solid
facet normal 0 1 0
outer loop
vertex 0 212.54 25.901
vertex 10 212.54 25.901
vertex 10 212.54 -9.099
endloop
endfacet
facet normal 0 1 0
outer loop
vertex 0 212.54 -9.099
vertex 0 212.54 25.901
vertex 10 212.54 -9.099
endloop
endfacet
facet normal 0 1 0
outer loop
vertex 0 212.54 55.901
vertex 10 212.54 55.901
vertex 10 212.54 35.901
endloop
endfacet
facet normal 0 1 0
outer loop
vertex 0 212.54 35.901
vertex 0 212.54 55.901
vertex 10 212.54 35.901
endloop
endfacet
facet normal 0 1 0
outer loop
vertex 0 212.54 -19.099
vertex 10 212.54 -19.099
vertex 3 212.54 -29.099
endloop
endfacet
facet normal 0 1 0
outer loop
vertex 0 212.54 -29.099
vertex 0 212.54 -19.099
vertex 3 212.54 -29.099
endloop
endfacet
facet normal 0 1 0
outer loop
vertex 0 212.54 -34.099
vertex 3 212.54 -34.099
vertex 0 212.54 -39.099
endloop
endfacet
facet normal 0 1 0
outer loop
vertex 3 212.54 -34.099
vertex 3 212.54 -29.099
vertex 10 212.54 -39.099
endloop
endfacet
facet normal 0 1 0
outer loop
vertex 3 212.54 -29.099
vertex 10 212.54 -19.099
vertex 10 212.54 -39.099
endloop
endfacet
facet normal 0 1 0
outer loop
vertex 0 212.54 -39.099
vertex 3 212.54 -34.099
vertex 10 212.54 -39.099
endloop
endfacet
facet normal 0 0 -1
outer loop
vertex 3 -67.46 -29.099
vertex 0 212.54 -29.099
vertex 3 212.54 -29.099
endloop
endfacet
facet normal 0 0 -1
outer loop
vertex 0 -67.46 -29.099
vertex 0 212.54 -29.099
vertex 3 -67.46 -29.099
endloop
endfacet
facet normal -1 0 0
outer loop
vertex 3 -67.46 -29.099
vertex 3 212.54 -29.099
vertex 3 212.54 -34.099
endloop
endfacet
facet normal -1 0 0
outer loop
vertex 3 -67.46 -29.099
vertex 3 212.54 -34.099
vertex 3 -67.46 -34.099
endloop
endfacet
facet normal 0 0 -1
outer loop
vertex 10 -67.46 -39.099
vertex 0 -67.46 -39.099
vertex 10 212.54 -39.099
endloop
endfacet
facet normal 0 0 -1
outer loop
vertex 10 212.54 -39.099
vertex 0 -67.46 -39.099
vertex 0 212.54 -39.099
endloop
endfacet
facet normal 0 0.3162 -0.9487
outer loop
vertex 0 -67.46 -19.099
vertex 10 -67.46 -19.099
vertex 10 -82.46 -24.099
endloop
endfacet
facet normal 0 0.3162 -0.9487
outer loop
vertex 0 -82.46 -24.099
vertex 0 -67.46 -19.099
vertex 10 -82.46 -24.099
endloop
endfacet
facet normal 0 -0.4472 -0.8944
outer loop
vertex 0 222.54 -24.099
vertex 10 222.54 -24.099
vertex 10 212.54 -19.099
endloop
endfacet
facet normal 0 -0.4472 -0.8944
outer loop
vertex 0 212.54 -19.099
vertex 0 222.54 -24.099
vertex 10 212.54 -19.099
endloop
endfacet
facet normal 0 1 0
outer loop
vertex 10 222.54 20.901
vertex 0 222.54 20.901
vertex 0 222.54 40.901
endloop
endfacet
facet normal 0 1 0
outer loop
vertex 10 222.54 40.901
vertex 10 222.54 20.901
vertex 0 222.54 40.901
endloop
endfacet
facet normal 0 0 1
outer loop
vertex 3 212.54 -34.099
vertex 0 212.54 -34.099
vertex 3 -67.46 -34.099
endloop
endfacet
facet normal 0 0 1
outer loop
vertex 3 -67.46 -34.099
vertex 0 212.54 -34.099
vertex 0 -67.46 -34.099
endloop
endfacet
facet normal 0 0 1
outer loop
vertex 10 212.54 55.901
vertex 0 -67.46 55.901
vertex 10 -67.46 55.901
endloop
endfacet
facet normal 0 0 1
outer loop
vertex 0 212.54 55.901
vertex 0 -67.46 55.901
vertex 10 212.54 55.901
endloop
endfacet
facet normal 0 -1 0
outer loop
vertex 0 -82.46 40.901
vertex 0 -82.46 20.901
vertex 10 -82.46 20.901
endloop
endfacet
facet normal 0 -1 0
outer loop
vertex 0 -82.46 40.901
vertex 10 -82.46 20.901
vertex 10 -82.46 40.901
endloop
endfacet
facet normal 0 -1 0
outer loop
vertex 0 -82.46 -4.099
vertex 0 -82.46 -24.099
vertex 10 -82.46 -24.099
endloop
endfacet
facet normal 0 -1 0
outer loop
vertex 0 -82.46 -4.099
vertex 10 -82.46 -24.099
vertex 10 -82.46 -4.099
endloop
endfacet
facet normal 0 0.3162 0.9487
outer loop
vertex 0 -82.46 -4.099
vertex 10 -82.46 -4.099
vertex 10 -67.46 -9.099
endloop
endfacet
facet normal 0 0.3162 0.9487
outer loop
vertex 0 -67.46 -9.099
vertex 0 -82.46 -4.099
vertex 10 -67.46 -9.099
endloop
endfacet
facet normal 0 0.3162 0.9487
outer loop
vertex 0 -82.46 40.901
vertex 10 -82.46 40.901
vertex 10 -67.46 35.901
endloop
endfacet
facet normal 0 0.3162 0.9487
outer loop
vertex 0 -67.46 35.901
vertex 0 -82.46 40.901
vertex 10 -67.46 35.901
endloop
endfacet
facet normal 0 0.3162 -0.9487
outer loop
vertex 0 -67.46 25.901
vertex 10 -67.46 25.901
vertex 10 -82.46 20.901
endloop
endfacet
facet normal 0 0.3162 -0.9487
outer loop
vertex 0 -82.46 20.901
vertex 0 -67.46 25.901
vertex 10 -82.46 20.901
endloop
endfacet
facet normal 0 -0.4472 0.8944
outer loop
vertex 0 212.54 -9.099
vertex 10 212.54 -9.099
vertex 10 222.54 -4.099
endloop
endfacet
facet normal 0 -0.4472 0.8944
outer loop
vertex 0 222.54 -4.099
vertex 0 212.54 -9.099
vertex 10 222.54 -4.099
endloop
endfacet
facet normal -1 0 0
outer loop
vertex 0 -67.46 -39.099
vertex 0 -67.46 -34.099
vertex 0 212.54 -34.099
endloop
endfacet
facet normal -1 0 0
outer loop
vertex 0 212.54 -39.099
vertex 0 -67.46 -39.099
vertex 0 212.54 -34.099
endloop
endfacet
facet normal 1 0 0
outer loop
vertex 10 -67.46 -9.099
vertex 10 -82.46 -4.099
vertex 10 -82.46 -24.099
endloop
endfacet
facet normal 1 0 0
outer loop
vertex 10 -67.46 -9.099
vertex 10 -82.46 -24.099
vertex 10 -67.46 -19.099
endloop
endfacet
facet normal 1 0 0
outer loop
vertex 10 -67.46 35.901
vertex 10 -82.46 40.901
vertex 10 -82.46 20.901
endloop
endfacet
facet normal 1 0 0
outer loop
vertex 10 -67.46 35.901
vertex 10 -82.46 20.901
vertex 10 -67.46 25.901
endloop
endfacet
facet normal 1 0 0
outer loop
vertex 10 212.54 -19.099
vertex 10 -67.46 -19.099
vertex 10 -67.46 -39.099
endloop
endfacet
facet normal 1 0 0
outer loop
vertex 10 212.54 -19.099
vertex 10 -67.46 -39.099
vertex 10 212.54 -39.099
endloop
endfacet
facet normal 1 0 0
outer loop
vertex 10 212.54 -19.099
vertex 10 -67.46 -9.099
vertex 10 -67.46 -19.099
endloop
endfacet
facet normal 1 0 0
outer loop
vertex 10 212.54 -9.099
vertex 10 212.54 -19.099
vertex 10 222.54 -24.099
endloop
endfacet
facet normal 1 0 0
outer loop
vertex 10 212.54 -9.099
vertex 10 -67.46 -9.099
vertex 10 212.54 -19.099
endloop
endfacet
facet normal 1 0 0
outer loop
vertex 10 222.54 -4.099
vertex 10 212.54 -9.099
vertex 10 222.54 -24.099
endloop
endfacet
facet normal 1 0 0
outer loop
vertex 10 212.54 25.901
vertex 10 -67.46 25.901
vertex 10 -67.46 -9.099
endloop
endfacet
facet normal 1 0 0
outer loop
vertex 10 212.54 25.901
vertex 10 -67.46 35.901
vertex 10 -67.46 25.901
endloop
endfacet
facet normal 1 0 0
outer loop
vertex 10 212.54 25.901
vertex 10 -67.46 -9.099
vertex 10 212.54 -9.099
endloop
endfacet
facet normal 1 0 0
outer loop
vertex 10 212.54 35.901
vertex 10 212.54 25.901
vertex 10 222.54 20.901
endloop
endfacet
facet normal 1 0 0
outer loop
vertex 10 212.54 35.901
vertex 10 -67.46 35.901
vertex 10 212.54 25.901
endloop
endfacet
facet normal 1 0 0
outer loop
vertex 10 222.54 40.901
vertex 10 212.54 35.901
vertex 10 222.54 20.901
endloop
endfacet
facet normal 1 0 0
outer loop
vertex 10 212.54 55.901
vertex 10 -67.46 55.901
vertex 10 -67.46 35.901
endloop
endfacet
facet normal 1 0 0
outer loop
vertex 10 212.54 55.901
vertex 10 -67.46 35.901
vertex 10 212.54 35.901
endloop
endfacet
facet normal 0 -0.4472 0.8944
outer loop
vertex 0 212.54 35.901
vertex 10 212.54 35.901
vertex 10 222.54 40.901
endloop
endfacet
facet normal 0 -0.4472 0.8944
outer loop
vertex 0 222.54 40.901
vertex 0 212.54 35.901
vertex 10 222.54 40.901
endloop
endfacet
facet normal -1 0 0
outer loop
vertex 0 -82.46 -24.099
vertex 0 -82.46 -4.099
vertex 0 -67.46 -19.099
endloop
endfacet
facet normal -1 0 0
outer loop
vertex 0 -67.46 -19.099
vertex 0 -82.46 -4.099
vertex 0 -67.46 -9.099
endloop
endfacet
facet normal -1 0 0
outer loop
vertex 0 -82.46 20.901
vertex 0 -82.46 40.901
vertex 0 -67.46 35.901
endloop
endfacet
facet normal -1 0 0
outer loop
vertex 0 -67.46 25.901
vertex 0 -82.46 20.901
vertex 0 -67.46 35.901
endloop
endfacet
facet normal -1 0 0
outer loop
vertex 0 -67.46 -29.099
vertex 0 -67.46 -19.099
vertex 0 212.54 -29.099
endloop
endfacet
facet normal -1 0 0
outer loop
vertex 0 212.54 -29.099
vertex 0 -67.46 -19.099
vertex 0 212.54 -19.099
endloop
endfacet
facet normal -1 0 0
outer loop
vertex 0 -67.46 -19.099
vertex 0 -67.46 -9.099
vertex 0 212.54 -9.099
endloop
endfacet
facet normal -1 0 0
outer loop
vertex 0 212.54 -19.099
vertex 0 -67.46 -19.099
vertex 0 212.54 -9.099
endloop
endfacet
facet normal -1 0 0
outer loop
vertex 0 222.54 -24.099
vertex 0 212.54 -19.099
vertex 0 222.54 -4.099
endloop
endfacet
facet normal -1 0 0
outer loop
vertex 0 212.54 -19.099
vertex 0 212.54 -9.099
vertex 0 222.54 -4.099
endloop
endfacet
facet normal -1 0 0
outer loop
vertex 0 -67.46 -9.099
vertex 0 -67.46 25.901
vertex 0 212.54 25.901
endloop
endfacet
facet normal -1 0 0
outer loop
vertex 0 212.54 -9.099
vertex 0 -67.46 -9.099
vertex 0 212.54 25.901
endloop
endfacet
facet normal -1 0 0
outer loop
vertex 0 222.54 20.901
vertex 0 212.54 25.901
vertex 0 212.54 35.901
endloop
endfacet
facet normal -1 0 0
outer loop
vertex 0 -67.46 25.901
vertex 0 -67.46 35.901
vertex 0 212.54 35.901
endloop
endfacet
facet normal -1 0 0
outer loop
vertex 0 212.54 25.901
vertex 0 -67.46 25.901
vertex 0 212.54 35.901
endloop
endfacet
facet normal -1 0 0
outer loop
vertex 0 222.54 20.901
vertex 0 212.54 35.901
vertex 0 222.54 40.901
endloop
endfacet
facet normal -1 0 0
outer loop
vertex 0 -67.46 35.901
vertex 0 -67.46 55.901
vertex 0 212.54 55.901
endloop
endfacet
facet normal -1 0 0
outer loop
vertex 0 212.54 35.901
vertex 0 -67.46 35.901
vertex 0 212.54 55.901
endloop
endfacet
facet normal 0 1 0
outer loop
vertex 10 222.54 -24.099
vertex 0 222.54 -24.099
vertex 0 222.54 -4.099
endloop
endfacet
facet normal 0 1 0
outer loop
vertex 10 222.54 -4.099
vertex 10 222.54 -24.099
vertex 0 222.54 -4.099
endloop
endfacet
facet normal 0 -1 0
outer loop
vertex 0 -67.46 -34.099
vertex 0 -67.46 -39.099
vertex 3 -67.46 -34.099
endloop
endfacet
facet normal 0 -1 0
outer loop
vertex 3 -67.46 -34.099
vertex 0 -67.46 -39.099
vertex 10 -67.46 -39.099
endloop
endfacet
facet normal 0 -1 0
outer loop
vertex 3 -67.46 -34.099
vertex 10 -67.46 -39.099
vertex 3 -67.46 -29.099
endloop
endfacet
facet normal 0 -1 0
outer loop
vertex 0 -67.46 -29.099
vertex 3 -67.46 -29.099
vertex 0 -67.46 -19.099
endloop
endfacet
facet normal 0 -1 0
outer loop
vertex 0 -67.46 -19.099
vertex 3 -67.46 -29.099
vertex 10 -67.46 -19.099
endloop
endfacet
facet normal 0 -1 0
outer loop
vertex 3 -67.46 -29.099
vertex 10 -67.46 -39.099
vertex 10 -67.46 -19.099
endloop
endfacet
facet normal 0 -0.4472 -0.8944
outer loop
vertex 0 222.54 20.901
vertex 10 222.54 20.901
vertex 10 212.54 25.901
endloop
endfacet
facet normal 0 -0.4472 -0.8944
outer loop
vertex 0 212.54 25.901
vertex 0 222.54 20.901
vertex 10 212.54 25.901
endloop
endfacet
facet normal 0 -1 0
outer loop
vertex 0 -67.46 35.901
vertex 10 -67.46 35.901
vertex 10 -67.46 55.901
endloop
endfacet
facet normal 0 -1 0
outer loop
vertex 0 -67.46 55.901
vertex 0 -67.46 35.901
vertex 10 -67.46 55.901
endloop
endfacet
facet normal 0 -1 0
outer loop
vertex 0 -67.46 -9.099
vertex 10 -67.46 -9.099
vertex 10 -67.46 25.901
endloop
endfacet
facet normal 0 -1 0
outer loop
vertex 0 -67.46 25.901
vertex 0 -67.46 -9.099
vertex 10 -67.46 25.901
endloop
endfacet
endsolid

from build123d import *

# Parameters (mm, degrees)
F0_W     = 305
F0_H     = 95
F1_DEPTH = 10
F3_DEPTH = 25
F4_W     = 290
F4_H     = 5
F5_DEPTH = 3
F7_DEPTH = 25


with BuildPart() as f1:
    # F0 (on Right) → F1 (new body)
    with BuildSketch(Plane.YZ):
        with Locations((70.039693, 8.401494)):
            Rectangle(F0_W, F0_H)
    extrude(amount=F1_DEPTH)

    # F2 (on face) → F3 (cut)
    with BuildSketch(Plane.YZ.offset(10)):
        Polygon((-82.460307, 55.901494), (-82.460307, 40.901494), (-67.460307, 35.901494), (-67.460307, 55.901494), align=None)
        Polygon((-67.460307, 25.901494), (-82.460307, 20.901494), (-82.460307, -4.098506), (-67.460307, -9.098506), align=None)
        Polygon((-67.460307, -19.098506), (-82.460307, -24.098506), (-82.460307, -39.098506), (-67.460307, -39.098506), align=None)
    extrude(amount=-F3_DEPTH, mode=Mode.SUBTRACT)

    # F4 (on face) → F5 (cut)
    with BuildSketch(Plane(origin=(0, 0, 0), x_dir=(0, -1, 0), z_dir=(-1, 0, 0))):
        with Locations((-77.539693, -31.598506)):
            Rectangle(F4_W, F4_H)
    extrude(amount=-F5_DEPTH, mode=Mode.SUBTRACT)

    # F6 (on face) → F7 (cut)
    with BuildSketch(Plane.YZ.offset(10)):
        Polygon((212.539693, 35.901494), (222.539693, 40.901494), (222.539693, 55.901494), (212.539693, 55.901494), align=None)
        Polygon((222.539693, -4.098506), (222.539693, 20.901494), (212.539693, 25.901494), (212.539693, -9.098506), align=None)
        Polygon((222.539693, -39.098506), (222.539693, -24.098506), (212.539693, -19.098506), (212.539693, -39.098506), align=None)
    extrude(amount=-F7_DEPTH, mode=Mode.SUBTRACT)


solid = f1.part
